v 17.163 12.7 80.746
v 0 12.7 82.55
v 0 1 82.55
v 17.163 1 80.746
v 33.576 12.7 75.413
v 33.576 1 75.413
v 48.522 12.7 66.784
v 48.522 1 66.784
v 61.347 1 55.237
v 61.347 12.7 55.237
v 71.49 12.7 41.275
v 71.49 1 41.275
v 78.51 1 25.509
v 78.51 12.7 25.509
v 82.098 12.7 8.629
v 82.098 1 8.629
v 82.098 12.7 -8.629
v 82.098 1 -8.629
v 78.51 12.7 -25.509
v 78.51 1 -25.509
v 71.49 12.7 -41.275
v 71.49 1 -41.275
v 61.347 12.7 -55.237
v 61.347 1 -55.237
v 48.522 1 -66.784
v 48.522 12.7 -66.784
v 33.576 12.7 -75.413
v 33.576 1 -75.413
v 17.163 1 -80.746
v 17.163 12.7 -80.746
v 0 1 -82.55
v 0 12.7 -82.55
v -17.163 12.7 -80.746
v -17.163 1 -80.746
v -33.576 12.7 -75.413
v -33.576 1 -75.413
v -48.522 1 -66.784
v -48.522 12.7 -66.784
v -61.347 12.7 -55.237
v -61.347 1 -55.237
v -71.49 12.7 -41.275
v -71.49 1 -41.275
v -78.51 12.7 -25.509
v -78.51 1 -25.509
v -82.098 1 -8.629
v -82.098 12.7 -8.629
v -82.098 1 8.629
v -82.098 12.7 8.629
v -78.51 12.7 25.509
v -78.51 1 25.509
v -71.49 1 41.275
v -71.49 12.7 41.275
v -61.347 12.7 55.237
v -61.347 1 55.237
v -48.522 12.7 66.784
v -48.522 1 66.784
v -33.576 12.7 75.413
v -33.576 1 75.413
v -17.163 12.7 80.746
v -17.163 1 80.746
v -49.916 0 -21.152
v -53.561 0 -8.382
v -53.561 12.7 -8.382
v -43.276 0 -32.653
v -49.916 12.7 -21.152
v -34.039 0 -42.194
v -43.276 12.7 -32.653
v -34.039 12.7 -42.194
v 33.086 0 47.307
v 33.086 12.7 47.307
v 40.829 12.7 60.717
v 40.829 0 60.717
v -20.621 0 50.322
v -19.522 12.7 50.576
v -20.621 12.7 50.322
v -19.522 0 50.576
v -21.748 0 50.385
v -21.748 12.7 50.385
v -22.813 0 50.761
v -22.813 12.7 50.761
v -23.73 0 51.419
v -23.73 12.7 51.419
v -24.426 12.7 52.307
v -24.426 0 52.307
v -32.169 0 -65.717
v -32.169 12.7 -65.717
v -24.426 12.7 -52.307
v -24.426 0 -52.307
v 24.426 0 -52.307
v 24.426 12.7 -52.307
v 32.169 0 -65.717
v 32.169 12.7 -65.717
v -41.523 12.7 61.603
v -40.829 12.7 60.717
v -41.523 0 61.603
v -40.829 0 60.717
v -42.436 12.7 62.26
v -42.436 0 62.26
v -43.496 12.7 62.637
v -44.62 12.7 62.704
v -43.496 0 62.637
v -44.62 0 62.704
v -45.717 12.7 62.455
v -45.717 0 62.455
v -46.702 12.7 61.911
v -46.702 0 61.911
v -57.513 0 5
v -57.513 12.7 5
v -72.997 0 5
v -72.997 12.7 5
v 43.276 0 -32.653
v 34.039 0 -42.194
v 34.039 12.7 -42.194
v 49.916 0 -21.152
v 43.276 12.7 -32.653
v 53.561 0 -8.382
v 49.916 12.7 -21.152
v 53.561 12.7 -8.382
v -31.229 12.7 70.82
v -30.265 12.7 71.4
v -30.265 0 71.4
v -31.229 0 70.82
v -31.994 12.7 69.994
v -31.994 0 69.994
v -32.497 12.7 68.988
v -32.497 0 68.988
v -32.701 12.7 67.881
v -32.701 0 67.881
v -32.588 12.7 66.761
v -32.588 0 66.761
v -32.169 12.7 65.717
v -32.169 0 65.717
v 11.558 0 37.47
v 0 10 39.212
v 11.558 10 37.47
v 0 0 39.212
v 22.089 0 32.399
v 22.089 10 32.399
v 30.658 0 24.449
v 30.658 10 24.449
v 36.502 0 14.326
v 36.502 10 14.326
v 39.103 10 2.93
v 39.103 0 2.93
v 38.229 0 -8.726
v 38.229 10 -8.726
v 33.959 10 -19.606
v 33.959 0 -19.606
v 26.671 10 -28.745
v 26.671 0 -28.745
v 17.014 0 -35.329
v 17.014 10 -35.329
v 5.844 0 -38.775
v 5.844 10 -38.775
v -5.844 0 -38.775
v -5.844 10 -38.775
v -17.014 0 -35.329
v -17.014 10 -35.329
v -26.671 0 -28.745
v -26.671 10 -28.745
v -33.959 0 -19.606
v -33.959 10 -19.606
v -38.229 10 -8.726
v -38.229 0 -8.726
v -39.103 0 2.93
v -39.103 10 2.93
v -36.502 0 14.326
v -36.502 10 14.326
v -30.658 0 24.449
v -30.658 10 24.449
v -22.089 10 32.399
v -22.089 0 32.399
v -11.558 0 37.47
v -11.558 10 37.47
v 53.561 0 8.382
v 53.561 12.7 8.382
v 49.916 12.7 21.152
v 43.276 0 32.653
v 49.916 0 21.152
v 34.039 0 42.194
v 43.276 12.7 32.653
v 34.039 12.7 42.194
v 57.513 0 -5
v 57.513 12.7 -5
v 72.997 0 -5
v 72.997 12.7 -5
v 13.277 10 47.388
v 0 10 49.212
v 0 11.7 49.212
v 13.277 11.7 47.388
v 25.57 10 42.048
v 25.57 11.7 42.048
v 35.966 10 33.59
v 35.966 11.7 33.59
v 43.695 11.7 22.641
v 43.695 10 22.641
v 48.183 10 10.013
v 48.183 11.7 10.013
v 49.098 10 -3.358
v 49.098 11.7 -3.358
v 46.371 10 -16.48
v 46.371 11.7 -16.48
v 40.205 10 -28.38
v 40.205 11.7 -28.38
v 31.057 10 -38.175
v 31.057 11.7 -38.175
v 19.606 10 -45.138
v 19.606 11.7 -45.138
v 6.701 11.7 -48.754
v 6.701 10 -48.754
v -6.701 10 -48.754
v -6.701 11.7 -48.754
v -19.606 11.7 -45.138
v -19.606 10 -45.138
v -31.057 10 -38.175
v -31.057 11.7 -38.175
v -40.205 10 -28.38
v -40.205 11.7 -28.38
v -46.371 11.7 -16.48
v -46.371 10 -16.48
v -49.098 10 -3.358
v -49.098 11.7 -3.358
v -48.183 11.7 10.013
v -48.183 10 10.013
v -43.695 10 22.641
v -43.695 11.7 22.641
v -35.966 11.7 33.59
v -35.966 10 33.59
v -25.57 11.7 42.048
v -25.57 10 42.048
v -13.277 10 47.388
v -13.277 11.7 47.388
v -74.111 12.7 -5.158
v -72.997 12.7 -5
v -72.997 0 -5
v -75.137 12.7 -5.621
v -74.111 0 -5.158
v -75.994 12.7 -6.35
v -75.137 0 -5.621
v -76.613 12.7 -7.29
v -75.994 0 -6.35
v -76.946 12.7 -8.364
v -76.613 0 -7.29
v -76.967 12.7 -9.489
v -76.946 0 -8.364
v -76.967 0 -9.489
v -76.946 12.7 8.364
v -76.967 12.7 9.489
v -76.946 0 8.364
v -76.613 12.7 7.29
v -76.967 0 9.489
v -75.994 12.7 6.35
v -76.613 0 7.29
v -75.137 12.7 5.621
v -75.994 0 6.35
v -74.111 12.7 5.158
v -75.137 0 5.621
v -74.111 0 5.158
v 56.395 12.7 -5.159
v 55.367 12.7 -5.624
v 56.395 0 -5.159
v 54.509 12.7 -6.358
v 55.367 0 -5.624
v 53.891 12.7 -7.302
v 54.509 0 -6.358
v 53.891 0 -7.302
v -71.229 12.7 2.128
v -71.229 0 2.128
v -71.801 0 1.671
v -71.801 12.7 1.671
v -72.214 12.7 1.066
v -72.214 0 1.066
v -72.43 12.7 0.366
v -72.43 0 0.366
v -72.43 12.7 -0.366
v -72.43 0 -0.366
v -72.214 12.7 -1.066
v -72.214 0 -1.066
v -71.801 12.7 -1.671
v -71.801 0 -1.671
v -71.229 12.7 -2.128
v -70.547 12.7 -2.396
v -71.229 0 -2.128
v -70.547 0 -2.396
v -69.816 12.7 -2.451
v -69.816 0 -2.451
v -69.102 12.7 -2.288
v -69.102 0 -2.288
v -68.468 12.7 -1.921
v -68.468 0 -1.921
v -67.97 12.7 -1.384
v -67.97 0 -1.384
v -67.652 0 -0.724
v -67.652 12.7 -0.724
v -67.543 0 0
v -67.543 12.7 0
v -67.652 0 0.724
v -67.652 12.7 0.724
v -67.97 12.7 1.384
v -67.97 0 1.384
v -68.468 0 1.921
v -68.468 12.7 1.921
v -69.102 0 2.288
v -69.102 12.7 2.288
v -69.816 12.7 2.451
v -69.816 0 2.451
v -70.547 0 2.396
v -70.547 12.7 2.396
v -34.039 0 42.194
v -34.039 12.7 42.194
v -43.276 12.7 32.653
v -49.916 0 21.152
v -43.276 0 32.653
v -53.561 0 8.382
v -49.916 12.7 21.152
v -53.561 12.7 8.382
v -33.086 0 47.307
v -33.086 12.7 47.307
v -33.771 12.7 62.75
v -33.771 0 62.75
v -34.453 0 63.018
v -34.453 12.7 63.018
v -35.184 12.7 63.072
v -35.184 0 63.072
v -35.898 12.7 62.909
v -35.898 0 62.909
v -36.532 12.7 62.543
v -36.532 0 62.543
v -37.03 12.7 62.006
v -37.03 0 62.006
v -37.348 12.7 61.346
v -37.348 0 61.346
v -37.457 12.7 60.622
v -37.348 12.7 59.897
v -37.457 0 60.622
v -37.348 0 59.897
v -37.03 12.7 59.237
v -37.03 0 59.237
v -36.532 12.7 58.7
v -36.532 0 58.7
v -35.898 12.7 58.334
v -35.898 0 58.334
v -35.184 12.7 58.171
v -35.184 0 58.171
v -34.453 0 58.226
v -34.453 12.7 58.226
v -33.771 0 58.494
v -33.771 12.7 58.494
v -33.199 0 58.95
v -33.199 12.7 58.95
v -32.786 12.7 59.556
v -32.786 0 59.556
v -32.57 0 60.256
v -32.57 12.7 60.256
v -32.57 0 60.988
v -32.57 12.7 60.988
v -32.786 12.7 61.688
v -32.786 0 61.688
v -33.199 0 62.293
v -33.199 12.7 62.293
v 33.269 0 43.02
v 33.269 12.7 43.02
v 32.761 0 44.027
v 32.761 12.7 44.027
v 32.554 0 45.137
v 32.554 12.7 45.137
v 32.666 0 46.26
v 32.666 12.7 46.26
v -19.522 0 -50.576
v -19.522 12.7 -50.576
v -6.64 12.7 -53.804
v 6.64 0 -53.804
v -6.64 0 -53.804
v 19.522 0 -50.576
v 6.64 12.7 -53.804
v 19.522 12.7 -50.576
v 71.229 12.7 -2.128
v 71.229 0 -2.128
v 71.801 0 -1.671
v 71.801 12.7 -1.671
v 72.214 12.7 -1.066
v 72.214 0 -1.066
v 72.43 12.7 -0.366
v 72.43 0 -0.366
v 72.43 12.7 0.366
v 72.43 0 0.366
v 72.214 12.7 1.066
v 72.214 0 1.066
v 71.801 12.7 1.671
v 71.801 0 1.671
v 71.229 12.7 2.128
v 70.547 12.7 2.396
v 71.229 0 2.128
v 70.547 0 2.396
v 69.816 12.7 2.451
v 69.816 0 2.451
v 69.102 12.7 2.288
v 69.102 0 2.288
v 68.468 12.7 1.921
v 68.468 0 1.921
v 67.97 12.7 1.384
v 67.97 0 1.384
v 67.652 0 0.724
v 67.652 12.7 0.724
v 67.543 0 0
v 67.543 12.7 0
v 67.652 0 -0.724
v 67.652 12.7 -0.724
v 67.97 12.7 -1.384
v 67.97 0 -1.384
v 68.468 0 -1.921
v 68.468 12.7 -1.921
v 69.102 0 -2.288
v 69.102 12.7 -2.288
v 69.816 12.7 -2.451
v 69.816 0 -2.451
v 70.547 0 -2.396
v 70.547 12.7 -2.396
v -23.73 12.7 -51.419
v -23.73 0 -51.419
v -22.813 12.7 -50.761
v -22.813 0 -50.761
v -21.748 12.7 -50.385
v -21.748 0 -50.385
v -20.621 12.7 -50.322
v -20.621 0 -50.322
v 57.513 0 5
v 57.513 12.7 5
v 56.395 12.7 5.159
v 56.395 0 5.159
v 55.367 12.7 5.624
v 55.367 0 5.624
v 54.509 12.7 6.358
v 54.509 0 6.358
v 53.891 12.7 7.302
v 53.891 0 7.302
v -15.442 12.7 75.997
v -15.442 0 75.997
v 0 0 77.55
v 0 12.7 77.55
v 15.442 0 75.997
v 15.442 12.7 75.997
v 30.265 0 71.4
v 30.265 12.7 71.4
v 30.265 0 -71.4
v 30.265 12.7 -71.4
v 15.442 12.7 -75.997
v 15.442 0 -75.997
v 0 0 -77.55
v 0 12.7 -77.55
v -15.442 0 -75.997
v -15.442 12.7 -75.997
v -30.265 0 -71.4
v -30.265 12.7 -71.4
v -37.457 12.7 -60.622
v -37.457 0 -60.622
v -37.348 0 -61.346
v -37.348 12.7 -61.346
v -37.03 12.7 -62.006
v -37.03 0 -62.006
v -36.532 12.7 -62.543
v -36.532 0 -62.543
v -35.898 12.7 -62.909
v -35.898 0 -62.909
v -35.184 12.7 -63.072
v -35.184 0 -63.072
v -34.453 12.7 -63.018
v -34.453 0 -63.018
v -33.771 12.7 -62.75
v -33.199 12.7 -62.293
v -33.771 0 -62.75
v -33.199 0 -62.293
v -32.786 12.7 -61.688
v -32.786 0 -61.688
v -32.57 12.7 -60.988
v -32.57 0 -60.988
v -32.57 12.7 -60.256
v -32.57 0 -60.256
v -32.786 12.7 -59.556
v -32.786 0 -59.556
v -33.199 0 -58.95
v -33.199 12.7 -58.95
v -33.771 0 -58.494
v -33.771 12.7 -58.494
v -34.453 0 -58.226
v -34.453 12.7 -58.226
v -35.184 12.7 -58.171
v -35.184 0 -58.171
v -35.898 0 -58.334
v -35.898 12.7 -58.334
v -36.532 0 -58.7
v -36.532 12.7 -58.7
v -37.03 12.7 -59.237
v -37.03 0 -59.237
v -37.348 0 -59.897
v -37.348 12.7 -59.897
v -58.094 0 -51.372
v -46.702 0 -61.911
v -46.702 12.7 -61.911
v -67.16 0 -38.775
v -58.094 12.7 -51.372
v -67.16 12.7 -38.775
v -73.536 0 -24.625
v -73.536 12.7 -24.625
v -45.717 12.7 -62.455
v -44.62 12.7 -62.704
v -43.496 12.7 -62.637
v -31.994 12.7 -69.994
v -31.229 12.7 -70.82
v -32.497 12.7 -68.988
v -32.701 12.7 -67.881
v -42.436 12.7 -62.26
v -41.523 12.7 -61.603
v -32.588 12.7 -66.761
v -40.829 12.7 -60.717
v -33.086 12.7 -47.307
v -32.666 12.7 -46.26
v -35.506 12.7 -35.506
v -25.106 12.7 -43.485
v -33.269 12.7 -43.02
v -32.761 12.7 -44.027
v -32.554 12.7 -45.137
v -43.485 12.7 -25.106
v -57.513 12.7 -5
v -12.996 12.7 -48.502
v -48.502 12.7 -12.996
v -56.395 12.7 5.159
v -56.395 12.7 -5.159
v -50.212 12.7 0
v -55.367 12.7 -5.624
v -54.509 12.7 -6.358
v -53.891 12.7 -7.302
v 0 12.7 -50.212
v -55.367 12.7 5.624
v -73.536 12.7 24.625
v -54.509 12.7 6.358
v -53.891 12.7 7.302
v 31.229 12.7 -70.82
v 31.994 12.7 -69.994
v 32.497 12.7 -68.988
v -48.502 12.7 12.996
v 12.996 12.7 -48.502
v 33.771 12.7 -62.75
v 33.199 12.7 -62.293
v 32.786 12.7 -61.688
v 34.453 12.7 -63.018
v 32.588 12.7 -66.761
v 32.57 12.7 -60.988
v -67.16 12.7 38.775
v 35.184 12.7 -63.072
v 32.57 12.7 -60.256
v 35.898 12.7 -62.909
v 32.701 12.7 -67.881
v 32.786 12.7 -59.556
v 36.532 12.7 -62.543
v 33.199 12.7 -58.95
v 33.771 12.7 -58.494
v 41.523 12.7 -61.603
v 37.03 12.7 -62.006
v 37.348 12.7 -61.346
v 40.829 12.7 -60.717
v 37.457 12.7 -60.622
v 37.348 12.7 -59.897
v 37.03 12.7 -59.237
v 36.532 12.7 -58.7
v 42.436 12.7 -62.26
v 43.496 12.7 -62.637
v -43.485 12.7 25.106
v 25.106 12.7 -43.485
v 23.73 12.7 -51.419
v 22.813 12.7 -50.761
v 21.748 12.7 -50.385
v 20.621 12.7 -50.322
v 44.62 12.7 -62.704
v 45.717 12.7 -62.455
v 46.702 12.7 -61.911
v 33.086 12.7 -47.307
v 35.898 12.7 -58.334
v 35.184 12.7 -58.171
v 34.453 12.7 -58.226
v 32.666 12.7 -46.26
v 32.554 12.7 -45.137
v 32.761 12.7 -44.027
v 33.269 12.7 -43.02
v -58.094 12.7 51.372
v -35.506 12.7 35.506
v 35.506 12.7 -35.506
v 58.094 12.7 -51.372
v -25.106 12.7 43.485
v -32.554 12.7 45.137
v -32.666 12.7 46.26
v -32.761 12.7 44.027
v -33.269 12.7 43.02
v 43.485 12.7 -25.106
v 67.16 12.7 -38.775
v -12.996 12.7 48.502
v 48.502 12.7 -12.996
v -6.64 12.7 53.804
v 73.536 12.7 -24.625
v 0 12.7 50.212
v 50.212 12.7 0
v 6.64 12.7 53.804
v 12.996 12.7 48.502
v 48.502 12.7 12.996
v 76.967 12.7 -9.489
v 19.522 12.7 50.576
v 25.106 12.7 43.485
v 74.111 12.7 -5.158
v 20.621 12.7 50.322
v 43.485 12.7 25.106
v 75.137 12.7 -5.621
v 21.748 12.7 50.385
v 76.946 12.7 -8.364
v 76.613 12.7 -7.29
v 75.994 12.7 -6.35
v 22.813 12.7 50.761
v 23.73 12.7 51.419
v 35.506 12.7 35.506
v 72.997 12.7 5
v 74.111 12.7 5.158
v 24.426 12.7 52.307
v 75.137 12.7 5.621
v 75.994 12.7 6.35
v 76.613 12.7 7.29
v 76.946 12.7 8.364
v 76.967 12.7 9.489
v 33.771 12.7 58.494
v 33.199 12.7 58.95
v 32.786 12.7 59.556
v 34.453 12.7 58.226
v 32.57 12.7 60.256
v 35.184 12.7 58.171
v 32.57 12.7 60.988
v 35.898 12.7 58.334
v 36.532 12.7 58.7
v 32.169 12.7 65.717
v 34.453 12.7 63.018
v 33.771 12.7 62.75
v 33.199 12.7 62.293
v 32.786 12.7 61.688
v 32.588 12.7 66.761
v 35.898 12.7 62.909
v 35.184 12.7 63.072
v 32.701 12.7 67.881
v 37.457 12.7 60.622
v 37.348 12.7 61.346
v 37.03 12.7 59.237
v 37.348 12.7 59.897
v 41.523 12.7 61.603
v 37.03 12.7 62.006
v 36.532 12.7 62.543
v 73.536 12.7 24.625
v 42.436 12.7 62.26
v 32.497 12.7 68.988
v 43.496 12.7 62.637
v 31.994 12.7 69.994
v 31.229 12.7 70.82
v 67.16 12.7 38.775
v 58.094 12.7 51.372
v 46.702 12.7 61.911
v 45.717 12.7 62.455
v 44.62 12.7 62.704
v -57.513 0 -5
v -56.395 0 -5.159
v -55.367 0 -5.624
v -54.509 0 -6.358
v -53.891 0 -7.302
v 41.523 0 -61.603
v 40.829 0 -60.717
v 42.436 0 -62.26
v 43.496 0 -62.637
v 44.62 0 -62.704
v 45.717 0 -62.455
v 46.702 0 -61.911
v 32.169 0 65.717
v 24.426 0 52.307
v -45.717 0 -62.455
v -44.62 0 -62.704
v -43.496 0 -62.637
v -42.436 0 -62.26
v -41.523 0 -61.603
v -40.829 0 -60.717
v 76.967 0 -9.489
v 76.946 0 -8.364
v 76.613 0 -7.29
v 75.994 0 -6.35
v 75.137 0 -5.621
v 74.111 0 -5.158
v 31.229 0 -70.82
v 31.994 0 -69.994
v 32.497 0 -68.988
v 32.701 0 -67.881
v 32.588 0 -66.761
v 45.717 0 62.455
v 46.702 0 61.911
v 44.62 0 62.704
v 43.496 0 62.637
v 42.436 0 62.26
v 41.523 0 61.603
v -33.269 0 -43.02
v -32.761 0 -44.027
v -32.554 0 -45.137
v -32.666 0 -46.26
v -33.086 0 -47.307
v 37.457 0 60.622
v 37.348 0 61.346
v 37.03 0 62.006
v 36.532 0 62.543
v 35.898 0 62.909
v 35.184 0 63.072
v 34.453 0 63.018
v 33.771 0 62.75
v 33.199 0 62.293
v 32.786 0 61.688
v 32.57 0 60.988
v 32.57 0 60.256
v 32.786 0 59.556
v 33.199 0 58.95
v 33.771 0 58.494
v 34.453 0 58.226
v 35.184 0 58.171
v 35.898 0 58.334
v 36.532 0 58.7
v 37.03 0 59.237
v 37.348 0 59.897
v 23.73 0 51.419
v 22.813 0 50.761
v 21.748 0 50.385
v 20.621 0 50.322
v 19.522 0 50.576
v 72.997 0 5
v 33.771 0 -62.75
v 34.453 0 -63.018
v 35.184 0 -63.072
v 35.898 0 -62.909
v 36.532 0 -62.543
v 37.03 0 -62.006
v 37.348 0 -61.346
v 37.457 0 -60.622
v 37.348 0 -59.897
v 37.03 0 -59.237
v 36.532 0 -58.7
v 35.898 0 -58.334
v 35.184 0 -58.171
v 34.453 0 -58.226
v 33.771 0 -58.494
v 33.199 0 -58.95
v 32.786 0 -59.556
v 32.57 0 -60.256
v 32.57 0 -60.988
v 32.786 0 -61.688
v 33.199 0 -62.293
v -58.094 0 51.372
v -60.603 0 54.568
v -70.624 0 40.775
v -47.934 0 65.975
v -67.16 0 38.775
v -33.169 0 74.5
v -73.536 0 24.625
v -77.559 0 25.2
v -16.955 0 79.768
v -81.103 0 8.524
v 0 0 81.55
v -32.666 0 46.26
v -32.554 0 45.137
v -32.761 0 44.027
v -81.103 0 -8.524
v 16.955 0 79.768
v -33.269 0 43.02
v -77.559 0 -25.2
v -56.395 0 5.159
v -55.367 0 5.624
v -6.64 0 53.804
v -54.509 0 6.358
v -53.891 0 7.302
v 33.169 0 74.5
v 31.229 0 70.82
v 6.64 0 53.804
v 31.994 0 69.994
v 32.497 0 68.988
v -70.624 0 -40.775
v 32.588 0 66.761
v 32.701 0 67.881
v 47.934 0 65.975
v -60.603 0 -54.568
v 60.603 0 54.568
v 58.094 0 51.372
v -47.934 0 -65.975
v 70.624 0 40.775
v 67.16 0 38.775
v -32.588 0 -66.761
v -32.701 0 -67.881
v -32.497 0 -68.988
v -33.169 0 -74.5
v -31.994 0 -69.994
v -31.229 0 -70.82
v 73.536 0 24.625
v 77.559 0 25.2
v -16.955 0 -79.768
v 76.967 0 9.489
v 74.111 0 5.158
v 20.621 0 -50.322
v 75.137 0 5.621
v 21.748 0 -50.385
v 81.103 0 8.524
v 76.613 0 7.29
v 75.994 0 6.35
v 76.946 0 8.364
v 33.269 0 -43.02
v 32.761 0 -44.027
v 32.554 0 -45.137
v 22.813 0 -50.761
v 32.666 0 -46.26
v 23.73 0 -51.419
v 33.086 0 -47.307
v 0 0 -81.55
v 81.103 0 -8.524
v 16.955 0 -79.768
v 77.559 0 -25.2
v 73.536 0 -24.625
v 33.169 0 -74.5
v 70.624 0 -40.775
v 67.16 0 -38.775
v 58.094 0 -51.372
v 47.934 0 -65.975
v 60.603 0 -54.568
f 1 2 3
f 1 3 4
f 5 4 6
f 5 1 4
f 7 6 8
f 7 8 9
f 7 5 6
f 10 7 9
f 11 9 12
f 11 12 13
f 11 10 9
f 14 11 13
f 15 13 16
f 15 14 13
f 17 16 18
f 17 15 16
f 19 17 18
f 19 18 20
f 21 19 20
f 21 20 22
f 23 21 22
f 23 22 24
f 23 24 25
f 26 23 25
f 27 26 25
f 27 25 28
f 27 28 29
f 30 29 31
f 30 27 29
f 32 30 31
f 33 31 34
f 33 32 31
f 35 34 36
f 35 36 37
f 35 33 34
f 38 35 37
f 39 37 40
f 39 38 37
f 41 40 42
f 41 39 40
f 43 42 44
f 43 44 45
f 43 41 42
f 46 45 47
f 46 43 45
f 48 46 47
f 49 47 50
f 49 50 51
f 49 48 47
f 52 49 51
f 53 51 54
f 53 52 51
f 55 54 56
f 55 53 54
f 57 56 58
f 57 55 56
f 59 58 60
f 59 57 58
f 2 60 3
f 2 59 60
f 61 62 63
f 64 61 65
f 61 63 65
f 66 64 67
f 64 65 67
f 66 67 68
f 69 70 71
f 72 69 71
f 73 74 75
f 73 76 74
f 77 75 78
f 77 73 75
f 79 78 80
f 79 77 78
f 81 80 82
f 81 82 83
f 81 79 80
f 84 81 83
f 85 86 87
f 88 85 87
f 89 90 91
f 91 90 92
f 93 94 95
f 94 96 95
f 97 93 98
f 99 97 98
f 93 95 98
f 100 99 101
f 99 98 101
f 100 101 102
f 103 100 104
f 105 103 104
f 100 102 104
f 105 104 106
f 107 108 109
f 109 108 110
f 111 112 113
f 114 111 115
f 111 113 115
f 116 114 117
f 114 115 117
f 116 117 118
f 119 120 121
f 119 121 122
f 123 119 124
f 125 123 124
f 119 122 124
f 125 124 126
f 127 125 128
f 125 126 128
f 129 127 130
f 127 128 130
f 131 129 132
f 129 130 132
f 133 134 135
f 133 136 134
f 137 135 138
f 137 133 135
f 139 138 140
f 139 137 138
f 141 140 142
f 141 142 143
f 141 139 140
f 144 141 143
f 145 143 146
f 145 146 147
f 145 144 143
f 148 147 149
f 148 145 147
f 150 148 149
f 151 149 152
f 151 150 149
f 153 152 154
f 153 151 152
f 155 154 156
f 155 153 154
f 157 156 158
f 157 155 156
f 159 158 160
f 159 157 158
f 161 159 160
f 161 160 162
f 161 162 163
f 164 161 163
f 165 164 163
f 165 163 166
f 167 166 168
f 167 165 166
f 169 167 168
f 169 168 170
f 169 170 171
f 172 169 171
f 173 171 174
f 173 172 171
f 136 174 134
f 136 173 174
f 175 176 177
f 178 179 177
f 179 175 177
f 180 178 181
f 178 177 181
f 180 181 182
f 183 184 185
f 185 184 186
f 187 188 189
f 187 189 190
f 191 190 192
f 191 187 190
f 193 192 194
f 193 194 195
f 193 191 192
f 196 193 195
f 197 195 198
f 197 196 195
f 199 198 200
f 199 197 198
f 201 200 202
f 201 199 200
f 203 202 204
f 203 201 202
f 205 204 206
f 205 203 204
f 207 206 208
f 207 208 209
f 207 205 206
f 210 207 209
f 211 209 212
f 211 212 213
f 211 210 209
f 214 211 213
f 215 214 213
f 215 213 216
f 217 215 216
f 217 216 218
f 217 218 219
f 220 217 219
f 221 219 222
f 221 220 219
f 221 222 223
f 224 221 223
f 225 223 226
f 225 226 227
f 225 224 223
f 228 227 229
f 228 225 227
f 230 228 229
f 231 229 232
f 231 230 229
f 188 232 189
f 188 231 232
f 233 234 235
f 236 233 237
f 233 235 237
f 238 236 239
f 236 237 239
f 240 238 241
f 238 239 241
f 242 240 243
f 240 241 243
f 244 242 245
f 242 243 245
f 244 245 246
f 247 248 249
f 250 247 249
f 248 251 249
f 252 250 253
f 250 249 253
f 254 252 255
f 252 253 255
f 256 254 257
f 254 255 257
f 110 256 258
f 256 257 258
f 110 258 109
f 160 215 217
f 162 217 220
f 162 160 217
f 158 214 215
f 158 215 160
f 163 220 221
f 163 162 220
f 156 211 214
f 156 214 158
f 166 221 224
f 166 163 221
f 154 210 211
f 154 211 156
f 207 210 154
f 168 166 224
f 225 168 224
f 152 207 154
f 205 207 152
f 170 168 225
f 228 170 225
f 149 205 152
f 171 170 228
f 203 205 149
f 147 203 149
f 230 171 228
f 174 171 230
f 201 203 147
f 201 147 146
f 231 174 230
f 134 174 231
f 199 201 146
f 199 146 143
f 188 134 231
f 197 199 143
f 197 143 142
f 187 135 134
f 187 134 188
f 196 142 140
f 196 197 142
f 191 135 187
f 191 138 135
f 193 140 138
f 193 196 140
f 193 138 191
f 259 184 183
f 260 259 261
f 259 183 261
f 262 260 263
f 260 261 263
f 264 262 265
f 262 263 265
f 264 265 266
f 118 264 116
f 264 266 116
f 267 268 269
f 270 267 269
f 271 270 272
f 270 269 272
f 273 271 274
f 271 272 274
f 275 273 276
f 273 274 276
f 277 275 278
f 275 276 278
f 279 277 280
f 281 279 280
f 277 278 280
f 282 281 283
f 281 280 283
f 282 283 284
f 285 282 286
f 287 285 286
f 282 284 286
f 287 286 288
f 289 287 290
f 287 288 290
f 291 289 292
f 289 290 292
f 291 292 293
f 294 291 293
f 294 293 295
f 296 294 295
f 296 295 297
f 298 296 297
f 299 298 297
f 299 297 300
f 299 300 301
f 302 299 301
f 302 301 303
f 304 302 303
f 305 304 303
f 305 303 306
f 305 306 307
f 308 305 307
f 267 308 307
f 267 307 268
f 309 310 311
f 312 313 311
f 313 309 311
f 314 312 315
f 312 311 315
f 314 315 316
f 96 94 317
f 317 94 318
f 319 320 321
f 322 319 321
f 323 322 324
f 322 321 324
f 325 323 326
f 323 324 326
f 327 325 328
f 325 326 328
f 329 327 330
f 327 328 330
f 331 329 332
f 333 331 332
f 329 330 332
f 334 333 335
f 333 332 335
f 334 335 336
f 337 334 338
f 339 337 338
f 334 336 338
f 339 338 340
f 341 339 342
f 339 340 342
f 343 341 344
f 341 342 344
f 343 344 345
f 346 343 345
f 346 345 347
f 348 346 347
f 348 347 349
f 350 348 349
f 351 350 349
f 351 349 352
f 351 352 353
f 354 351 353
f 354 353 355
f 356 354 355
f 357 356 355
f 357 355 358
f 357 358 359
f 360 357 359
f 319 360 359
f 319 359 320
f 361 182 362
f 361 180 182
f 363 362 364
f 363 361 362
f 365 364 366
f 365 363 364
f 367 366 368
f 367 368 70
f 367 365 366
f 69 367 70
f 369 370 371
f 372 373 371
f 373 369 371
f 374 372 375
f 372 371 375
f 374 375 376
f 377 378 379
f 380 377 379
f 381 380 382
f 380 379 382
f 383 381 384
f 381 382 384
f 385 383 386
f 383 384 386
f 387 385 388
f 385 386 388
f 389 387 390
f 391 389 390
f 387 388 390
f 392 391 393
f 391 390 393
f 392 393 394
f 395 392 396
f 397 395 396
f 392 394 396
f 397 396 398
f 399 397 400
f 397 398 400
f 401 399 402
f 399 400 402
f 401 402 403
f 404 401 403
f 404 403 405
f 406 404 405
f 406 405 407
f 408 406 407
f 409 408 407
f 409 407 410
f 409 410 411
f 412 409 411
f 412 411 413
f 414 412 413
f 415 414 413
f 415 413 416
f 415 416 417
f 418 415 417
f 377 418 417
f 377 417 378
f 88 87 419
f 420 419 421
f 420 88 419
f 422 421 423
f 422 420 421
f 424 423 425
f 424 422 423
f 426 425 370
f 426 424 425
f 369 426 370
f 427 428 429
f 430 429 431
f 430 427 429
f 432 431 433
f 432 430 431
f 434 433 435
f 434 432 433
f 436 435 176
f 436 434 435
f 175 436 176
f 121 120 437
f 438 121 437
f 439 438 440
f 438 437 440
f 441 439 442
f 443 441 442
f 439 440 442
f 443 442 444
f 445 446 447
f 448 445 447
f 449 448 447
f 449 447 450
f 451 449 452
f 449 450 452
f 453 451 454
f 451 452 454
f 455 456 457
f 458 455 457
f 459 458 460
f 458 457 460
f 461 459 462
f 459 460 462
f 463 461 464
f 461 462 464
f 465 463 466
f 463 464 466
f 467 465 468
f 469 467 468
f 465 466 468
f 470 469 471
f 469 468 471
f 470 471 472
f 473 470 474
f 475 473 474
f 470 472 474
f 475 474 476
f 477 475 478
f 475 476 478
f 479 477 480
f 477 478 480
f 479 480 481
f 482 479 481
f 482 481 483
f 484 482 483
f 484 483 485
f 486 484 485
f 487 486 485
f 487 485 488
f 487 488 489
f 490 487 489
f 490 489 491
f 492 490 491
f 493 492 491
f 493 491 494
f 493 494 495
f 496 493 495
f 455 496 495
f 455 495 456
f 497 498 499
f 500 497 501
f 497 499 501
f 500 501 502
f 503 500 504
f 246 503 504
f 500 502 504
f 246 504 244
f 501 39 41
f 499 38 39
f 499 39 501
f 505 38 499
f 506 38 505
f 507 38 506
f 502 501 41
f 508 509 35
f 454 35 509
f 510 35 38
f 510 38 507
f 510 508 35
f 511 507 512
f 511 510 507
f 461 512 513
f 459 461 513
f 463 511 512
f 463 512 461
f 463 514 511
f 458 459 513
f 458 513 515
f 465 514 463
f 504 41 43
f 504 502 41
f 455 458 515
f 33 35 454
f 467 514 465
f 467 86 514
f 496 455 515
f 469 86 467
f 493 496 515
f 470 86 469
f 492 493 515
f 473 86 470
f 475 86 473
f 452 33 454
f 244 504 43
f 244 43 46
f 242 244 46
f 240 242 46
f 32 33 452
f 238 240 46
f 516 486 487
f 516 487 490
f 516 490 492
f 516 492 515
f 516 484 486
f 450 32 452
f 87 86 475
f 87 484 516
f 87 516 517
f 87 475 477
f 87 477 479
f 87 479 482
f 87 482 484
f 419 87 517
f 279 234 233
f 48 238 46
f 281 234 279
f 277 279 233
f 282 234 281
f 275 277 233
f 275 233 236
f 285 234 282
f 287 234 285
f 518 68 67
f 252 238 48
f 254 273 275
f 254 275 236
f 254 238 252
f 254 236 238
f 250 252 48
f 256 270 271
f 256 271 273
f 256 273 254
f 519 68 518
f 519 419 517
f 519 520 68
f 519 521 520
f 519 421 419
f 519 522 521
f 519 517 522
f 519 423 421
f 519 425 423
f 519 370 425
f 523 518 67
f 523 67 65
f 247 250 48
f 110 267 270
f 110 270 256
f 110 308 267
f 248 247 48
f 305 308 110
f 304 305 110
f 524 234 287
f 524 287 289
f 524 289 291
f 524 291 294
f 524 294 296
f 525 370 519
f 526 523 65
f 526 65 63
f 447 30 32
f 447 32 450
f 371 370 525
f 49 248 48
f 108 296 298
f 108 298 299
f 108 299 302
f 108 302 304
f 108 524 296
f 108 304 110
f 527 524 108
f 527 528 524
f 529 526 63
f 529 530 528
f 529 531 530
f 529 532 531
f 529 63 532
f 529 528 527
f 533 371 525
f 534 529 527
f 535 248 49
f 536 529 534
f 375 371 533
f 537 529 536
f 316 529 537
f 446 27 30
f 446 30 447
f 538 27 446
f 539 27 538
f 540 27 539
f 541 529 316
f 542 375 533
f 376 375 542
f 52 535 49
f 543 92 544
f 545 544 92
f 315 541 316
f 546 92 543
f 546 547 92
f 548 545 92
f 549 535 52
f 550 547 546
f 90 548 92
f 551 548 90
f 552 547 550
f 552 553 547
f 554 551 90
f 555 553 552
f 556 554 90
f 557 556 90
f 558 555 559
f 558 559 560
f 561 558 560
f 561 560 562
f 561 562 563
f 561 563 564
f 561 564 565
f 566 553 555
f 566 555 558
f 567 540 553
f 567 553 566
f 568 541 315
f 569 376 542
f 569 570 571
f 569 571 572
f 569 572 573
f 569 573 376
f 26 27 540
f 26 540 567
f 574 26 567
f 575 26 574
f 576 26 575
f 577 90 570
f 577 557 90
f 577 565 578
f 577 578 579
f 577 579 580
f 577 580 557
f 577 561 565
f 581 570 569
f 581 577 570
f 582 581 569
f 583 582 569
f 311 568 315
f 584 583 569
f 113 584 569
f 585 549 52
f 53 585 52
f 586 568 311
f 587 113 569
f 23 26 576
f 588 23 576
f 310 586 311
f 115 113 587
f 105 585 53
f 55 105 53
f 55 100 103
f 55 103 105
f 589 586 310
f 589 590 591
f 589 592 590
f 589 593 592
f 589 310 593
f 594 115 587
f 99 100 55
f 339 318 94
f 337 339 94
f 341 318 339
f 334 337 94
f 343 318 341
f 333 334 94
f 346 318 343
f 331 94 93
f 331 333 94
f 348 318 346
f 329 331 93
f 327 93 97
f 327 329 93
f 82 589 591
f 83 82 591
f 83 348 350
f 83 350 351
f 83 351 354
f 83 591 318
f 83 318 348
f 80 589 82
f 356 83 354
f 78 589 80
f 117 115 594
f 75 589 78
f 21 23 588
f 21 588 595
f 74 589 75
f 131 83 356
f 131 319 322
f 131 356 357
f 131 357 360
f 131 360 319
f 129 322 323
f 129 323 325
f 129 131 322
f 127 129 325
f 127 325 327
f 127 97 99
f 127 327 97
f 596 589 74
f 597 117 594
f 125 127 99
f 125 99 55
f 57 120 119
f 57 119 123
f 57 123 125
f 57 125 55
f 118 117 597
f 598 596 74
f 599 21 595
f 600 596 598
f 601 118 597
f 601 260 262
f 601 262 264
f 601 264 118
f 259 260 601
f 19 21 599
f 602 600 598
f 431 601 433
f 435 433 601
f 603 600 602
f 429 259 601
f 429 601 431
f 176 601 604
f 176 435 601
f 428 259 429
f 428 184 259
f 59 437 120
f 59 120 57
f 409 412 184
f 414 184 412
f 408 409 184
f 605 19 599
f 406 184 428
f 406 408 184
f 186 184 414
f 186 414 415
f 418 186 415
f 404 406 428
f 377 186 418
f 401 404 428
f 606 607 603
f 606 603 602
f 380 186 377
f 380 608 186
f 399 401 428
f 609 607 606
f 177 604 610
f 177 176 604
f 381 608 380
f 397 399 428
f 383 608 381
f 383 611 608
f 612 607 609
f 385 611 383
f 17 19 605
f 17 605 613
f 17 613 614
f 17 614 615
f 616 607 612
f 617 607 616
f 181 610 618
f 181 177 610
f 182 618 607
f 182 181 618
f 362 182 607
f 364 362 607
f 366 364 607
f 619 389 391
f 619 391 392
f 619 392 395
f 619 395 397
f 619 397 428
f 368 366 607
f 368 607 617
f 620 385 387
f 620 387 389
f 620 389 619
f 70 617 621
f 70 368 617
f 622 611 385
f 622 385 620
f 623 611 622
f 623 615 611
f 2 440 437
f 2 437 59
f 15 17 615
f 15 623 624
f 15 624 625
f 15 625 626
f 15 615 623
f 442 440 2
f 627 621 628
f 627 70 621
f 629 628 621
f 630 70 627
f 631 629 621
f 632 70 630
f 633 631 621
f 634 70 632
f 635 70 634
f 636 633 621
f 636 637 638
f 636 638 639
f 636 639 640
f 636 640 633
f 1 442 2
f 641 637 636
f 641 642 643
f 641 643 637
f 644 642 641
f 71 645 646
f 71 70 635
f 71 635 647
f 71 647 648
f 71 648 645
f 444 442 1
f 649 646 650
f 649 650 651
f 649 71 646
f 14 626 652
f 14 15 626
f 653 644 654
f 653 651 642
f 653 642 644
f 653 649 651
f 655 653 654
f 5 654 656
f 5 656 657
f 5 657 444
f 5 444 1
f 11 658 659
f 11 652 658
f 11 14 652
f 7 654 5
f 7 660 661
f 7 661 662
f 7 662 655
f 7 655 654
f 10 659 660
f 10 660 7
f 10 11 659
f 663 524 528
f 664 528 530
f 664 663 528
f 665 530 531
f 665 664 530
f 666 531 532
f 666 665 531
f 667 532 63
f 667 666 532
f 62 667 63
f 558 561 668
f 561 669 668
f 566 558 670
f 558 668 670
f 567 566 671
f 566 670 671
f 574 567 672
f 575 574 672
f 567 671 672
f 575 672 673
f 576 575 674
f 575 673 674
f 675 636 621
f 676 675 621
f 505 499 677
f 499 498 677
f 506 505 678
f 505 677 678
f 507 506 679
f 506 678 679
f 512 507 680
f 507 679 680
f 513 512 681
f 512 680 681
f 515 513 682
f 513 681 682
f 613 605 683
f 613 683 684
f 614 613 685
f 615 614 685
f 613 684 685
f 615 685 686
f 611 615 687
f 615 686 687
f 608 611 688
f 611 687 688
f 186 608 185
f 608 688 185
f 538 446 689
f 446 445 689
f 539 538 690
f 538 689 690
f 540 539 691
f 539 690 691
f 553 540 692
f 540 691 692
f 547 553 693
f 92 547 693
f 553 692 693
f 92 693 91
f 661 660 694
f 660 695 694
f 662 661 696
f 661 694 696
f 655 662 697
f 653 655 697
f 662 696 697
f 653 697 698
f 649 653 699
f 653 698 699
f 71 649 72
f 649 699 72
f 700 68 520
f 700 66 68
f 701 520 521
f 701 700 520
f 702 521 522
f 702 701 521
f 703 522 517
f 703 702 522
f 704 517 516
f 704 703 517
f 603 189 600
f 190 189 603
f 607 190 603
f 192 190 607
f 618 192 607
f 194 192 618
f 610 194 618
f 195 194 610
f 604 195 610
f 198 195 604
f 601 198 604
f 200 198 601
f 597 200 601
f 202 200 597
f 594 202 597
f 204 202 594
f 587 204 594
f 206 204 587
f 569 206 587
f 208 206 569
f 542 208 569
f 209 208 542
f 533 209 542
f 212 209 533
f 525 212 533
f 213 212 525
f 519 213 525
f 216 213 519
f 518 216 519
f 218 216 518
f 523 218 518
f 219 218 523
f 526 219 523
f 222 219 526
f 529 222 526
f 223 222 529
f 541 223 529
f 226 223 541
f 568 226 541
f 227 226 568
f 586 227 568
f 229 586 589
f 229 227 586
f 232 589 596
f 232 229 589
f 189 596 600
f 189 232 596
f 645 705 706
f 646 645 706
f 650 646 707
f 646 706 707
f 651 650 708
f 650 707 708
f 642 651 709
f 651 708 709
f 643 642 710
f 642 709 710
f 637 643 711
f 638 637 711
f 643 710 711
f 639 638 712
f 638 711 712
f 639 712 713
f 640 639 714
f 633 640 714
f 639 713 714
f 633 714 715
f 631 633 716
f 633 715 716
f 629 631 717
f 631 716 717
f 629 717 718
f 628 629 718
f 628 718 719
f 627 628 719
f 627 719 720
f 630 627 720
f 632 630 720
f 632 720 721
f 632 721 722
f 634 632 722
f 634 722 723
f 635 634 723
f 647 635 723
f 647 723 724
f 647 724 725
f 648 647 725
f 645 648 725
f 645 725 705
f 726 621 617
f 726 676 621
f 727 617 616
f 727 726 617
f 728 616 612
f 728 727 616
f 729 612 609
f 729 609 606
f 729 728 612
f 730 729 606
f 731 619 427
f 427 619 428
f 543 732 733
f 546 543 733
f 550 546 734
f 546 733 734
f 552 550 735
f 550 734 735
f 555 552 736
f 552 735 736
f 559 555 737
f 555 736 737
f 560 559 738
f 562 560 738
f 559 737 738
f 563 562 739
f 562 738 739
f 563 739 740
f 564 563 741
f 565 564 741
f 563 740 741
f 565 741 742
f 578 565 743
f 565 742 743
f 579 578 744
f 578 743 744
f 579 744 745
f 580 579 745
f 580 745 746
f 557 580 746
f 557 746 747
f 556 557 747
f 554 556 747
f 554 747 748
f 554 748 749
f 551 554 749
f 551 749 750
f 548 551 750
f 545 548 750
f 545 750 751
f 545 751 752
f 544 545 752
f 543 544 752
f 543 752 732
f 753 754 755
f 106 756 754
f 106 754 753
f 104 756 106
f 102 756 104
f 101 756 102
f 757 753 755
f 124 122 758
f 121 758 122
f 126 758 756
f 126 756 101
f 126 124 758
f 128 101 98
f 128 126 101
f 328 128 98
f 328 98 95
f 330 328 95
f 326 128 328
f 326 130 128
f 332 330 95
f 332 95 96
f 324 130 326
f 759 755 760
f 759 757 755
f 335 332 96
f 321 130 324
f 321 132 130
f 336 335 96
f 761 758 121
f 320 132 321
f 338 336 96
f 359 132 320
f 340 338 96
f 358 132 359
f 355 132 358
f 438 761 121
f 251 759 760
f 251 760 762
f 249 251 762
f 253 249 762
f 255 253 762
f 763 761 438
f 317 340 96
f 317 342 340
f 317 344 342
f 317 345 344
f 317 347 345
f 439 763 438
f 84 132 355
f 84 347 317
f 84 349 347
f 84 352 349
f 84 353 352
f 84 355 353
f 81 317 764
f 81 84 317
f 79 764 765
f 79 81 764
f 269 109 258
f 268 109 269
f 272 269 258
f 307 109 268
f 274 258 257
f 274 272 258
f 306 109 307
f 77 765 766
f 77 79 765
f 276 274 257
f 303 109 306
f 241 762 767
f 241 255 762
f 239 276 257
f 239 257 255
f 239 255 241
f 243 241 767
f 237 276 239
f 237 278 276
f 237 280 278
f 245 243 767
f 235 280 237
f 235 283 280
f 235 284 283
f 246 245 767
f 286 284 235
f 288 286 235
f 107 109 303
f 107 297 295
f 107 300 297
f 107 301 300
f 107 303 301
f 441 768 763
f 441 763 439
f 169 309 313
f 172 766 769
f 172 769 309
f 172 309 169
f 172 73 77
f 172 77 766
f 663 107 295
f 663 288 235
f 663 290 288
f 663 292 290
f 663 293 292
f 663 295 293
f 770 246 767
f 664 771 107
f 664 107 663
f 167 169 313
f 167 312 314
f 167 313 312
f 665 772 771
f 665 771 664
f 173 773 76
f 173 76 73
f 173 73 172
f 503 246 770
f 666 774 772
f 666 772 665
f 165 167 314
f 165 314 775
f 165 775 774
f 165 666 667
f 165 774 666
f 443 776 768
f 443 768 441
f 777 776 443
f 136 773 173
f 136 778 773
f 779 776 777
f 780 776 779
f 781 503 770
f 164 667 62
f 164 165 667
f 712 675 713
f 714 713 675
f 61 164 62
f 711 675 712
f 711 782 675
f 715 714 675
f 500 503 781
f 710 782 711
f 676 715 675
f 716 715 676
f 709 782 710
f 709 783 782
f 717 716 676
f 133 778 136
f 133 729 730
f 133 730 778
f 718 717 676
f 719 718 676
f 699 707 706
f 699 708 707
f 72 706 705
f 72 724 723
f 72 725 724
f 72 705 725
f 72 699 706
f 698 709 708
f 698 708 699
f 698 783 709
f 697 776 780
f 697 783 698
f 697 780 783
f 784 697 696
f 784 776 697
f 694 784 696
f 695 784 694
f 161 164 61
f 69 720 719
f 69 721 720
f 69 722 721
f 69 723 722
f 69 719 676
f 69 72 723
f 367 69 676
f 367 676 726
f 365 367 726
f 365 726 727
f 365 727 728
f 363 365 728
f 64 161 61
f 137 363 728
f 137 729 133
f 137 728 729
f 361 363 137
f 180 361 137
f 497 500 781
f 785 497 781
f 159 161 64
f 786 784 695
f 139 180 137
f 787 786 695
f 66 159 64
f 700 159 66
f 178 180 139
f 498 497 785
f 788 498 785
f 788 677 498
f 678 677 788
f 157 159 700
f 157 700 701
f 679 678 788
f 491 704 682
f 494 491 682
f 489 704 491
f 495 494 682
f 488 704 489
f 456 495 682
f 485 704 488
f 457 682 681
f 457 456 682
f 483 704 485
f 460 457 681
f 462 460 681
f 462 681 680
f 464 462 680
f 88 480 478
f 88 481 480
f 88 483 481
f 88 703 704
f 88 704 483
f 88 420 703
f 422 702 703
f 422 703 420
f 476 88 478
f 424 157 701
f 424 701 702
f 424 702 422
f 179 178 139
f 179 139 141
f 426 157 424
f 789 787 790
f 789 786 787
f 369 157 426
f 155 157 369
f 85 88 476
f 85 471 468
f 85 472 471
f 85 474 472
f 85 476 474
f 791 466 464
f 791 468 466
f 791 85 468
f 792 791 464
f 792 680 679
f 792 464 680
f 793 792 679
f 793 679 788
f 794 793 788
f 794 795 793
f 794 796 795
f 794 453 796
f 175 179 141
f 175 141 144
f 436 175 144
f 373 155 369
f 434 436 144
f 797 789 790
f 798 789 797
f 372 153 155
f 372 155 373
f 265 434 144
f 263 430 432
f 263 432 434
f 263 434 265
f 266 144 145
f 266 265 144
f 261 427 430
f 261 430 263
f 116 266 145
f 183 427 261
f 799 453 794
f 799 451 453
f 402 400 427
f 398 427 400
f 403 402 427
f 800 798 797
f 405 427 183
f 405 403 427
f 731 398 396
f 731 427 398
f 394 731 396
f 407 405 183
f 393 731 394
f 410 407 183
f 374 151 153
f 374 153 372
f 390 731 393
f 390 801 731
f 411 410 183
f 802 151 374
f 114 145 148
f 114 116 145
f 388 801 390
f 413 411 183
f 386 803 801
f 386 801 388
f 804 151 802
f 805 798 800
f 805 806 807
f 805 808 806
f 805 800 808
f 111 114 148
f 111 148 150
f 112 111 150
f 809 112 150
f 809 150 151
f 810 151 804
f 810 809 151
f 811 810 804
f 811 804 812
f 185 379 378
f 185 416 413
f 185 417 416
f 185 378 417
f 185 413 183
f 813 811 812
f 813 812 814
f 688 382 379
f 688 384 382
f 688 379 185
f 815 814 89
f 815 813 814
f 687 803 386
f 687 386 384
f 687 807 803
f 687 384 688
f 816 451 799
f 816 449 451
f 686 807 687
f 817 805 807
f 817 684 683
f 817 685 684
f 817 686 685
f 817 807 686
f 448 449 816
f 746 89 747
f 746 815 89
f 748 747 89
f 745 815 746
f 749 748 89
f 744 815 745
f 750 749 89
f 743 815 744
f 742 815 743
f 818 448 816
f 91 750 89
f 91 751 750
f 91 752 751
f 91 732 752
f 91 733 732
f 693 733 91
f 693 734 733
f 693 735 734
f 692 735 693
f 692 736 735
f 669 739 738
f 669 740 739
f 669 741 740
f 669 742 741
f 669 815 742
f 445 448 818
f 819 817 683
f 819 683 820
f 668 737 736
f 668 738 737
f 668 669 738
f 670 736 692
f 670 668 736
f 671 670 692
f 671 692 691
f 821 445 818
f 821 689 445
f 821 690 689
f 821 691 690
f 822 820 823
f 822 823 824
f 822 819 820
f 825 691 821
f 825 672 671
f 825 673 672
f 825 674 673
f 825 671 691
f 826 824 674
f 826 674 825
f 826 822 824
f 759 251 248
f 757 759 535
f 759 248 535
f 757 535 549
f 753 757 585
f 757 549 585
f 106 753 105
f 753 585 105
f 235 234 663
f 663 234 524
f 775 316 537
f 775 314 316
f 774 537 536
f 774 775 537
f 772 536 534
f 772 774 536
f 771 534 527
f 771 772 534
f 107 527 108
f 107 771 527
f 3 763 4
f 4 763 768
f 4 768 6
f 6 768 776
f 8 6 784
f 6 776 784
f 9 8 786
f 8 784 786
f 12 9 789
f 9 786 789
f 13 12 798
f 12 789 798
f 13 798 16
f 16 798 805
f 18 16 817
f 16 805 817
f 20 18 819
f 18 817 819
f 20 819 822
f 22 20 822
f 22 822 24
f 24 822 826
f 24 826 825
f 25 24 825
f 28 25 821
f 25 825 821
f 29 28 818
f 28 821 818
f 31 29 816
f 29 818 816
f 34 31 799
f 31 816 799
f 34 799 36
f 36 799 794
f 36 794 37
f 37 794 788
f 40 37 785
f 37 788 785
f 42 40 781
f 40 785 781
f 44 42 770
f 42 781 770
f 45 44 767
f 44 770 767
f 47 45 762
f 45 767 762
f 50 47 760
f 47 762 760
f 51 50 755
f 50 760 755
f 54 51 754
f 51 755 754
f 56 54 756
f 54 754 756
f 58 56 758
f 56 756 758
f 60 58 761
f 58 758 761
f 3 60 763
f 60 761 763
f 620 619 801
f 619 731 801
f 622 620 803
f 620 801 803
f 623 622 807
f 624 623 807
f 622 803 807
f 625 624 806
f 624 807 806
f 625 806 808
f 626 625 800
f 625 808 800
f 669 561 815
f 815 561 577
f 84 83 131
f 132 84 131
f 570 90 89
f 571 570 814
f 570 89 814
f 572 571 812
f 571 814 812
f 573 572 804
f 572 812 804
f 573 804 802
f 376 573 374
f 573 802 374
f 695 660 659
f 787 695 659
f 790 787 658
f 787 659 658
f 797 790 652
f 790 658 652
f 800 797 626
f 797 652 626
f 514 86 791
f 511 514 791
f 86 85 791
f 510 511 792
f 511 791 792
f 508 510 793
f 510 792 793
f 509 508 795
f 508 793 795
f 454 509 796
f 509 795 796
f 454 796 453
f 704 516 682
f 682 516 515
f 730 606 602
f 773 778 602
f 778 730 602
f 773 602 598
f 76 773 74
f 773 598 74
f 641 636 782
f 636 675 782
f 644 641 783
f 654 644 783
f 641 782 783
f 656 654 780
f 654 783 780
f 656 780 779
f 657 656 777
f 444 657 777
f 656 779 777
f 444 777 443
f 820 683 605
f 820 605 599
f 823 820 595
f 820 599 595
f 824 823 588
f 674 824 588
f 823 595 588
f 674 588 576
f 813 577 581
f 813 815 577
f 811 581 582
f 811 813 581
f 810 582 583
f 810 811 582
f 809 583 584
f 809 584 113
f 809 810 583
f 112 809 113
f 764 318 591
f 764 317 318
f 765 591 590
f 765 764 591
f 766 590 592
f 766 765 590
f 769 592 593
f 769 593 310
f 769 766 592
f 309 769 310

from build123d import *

# Parameters (mm, degrees)
F_10_0_1935_DIAMETER_HOLE1_D = 4.9149
CIRPATTERN3_COUNT            = 6
CUT_EXTRUDE1_DEPTH           = 13.7
FILLET1_R                    = 4
CIRPATTERN4_COUNT            = 6
FILLET1_OF_CIRPATTERN4_R     = 4
CHAMFER1_SIZE                = 1
CHAMFER2_SIZE                = 1


with BuildPart() as part:
    # Sketch2 → Revolve1 (revolve)
    with BuildSketch(Plane(origin=(0, 0, 0), x_dir=(0, 0, -1), z_dir=(1, 0, 0))):
        Polygon((-39.2125, 0), (-82.55, 0), (-82.55, 12.7), (-49.2125, 12.7), (-49.2125, 10), (-39.2125, 10), align=None)
    revolve(axis=Axis((0, -0.635, 0), (0, 1, 0)))

    # #10 (0.1935) Diameter Hole1 (through all)
    with Locations(Plane(origin=(0, 12.7, 0), x_dir=(1, 0, 0), z_dir=(0, 1, 0))):
        with Locations((-35, 60.621778)):
            f_10_0_1935_diameter_hole1 = Hole(F_10_0_1935_DIAMETER_HOLE1_D / 2)

    # CirPattern3: #10 (0.1935) Diameter Hole1 ×6 about axis
    cirpattern3_axis = Axis((0, 0, 0), (0, 1, 0))
    for i in range(1, CIRPATTERN3_COUNT):
        add(f_10_0_1935_diameter_hole1.rotate(cirpattern3_axis, i * 360 / CIRPATTERN3_COUNT), mode=Mode.SUBTRACT)

    # Sketch8 → Cut-Extrude1 (cut, through all)
    with BuildSketch(Plane(origin=(0, 12.7, 0), x_dir=(1, 0, 0), z_dir=(0, 1, 0))):
        with BuildLine():
            Line((-34.364196, 69.520533), (-22.66059, 49.249293))
            ThreePointArc((-22.66059, 49.249293), (0, 54.2125), (22.66059, 49.249293))
            Line((22.66059, 49.249293), (34.364196, 69.520533))
            ThreePointArc((34.364196, 69.520533), (0, 77.55), (-34.364196, 69.520533))
        make_face()
    cut_extrude1 = extrude(amount=-CUT_EXTRUDE1_DEPTH, mode=Mode.SUBTRACT)

    # Fillet1
    fillet1_edges = [part.edges().sort_by_distance(p)[0] for p in [
        (22.66059, 6.35, -49.249293),
        (-22.66059, 6.35, -49.249293),
        (-34.364196, 6.35, -69.520533),
        (34.364196, 6.35, -69.520533),
    ]]
    fillet(fillet1_edges, radius=FILLET1_R)

    # CirPattern4: Cut-Extrude1 ×6 about axis
    cirpattern4_axis = Axis((0, 0, 0), (0, 1, 0))
    for i in range(1, CIRPATTERN4_COUNT):
        add(cut_extrude1.rotate(cirpattern4_axis, i * 360 / CIRPATTERN4_COUNT), mode=Mode.SUBTRACT)

    # Fillet1 of CirPattern4
    fillet1_of_cirpattern4_edges = [part.edges().sort_by_distance(p)[0] for p in [
        (-31.320844, 6.35, -44.249293),
        (-53.981433, 6.35, -5),
        (-77.388646, 6.35, -5),
        (-43.02445, 6.35, -64.520533),
        (-53.981433, 6.35, 5),
        (-31.320844, 6.35, 44.249293),
        (-43.02445, 6.35, 64.520533),
        (-77.388646, 6.35, 5),
        (-22.66059, 6.35, 49.249293),
        (22.66059, 6.35, 49.249293),
        (34.364196, 6.35, 69.520533),
        (-34.364196, 6.35, 69.520533),
        (31.320844, 6.35, 44.249293),
        (53.981433, 6.35, 5),
        (77.388646, 6.35, 5),
        (43.02445, 6.35, 64.520533),
        (53.981433, 6.35, -5),
        (31.320844, 6.35, -44.249293),
        (43.02445, 6.35, -64.520533),
        (77.388646, 6.35, -5),
    ]]
    fillet(fillet1_of_cirpattern4_edges, radius=FILLET1_OF_CIRPATTERN4_R)

    # Chamfer1
    chamfer1_edges = [part.edges().sort_by_distance(p)[0] for p in [
        (0, 12.7, -49.2125),
    ]]
    chamfer(chamfer1_edges, length=CHAMFER1_SIZE)

    # Chamfer2
    chamfer2_edges = [part.edges().sort_by_distance(p)[0] for p in [
        (0, 0, -82.55),
    ]]
    chamfer(chamfer2_edges, length=CHAMFER2_SIZE)


solid = part.part
